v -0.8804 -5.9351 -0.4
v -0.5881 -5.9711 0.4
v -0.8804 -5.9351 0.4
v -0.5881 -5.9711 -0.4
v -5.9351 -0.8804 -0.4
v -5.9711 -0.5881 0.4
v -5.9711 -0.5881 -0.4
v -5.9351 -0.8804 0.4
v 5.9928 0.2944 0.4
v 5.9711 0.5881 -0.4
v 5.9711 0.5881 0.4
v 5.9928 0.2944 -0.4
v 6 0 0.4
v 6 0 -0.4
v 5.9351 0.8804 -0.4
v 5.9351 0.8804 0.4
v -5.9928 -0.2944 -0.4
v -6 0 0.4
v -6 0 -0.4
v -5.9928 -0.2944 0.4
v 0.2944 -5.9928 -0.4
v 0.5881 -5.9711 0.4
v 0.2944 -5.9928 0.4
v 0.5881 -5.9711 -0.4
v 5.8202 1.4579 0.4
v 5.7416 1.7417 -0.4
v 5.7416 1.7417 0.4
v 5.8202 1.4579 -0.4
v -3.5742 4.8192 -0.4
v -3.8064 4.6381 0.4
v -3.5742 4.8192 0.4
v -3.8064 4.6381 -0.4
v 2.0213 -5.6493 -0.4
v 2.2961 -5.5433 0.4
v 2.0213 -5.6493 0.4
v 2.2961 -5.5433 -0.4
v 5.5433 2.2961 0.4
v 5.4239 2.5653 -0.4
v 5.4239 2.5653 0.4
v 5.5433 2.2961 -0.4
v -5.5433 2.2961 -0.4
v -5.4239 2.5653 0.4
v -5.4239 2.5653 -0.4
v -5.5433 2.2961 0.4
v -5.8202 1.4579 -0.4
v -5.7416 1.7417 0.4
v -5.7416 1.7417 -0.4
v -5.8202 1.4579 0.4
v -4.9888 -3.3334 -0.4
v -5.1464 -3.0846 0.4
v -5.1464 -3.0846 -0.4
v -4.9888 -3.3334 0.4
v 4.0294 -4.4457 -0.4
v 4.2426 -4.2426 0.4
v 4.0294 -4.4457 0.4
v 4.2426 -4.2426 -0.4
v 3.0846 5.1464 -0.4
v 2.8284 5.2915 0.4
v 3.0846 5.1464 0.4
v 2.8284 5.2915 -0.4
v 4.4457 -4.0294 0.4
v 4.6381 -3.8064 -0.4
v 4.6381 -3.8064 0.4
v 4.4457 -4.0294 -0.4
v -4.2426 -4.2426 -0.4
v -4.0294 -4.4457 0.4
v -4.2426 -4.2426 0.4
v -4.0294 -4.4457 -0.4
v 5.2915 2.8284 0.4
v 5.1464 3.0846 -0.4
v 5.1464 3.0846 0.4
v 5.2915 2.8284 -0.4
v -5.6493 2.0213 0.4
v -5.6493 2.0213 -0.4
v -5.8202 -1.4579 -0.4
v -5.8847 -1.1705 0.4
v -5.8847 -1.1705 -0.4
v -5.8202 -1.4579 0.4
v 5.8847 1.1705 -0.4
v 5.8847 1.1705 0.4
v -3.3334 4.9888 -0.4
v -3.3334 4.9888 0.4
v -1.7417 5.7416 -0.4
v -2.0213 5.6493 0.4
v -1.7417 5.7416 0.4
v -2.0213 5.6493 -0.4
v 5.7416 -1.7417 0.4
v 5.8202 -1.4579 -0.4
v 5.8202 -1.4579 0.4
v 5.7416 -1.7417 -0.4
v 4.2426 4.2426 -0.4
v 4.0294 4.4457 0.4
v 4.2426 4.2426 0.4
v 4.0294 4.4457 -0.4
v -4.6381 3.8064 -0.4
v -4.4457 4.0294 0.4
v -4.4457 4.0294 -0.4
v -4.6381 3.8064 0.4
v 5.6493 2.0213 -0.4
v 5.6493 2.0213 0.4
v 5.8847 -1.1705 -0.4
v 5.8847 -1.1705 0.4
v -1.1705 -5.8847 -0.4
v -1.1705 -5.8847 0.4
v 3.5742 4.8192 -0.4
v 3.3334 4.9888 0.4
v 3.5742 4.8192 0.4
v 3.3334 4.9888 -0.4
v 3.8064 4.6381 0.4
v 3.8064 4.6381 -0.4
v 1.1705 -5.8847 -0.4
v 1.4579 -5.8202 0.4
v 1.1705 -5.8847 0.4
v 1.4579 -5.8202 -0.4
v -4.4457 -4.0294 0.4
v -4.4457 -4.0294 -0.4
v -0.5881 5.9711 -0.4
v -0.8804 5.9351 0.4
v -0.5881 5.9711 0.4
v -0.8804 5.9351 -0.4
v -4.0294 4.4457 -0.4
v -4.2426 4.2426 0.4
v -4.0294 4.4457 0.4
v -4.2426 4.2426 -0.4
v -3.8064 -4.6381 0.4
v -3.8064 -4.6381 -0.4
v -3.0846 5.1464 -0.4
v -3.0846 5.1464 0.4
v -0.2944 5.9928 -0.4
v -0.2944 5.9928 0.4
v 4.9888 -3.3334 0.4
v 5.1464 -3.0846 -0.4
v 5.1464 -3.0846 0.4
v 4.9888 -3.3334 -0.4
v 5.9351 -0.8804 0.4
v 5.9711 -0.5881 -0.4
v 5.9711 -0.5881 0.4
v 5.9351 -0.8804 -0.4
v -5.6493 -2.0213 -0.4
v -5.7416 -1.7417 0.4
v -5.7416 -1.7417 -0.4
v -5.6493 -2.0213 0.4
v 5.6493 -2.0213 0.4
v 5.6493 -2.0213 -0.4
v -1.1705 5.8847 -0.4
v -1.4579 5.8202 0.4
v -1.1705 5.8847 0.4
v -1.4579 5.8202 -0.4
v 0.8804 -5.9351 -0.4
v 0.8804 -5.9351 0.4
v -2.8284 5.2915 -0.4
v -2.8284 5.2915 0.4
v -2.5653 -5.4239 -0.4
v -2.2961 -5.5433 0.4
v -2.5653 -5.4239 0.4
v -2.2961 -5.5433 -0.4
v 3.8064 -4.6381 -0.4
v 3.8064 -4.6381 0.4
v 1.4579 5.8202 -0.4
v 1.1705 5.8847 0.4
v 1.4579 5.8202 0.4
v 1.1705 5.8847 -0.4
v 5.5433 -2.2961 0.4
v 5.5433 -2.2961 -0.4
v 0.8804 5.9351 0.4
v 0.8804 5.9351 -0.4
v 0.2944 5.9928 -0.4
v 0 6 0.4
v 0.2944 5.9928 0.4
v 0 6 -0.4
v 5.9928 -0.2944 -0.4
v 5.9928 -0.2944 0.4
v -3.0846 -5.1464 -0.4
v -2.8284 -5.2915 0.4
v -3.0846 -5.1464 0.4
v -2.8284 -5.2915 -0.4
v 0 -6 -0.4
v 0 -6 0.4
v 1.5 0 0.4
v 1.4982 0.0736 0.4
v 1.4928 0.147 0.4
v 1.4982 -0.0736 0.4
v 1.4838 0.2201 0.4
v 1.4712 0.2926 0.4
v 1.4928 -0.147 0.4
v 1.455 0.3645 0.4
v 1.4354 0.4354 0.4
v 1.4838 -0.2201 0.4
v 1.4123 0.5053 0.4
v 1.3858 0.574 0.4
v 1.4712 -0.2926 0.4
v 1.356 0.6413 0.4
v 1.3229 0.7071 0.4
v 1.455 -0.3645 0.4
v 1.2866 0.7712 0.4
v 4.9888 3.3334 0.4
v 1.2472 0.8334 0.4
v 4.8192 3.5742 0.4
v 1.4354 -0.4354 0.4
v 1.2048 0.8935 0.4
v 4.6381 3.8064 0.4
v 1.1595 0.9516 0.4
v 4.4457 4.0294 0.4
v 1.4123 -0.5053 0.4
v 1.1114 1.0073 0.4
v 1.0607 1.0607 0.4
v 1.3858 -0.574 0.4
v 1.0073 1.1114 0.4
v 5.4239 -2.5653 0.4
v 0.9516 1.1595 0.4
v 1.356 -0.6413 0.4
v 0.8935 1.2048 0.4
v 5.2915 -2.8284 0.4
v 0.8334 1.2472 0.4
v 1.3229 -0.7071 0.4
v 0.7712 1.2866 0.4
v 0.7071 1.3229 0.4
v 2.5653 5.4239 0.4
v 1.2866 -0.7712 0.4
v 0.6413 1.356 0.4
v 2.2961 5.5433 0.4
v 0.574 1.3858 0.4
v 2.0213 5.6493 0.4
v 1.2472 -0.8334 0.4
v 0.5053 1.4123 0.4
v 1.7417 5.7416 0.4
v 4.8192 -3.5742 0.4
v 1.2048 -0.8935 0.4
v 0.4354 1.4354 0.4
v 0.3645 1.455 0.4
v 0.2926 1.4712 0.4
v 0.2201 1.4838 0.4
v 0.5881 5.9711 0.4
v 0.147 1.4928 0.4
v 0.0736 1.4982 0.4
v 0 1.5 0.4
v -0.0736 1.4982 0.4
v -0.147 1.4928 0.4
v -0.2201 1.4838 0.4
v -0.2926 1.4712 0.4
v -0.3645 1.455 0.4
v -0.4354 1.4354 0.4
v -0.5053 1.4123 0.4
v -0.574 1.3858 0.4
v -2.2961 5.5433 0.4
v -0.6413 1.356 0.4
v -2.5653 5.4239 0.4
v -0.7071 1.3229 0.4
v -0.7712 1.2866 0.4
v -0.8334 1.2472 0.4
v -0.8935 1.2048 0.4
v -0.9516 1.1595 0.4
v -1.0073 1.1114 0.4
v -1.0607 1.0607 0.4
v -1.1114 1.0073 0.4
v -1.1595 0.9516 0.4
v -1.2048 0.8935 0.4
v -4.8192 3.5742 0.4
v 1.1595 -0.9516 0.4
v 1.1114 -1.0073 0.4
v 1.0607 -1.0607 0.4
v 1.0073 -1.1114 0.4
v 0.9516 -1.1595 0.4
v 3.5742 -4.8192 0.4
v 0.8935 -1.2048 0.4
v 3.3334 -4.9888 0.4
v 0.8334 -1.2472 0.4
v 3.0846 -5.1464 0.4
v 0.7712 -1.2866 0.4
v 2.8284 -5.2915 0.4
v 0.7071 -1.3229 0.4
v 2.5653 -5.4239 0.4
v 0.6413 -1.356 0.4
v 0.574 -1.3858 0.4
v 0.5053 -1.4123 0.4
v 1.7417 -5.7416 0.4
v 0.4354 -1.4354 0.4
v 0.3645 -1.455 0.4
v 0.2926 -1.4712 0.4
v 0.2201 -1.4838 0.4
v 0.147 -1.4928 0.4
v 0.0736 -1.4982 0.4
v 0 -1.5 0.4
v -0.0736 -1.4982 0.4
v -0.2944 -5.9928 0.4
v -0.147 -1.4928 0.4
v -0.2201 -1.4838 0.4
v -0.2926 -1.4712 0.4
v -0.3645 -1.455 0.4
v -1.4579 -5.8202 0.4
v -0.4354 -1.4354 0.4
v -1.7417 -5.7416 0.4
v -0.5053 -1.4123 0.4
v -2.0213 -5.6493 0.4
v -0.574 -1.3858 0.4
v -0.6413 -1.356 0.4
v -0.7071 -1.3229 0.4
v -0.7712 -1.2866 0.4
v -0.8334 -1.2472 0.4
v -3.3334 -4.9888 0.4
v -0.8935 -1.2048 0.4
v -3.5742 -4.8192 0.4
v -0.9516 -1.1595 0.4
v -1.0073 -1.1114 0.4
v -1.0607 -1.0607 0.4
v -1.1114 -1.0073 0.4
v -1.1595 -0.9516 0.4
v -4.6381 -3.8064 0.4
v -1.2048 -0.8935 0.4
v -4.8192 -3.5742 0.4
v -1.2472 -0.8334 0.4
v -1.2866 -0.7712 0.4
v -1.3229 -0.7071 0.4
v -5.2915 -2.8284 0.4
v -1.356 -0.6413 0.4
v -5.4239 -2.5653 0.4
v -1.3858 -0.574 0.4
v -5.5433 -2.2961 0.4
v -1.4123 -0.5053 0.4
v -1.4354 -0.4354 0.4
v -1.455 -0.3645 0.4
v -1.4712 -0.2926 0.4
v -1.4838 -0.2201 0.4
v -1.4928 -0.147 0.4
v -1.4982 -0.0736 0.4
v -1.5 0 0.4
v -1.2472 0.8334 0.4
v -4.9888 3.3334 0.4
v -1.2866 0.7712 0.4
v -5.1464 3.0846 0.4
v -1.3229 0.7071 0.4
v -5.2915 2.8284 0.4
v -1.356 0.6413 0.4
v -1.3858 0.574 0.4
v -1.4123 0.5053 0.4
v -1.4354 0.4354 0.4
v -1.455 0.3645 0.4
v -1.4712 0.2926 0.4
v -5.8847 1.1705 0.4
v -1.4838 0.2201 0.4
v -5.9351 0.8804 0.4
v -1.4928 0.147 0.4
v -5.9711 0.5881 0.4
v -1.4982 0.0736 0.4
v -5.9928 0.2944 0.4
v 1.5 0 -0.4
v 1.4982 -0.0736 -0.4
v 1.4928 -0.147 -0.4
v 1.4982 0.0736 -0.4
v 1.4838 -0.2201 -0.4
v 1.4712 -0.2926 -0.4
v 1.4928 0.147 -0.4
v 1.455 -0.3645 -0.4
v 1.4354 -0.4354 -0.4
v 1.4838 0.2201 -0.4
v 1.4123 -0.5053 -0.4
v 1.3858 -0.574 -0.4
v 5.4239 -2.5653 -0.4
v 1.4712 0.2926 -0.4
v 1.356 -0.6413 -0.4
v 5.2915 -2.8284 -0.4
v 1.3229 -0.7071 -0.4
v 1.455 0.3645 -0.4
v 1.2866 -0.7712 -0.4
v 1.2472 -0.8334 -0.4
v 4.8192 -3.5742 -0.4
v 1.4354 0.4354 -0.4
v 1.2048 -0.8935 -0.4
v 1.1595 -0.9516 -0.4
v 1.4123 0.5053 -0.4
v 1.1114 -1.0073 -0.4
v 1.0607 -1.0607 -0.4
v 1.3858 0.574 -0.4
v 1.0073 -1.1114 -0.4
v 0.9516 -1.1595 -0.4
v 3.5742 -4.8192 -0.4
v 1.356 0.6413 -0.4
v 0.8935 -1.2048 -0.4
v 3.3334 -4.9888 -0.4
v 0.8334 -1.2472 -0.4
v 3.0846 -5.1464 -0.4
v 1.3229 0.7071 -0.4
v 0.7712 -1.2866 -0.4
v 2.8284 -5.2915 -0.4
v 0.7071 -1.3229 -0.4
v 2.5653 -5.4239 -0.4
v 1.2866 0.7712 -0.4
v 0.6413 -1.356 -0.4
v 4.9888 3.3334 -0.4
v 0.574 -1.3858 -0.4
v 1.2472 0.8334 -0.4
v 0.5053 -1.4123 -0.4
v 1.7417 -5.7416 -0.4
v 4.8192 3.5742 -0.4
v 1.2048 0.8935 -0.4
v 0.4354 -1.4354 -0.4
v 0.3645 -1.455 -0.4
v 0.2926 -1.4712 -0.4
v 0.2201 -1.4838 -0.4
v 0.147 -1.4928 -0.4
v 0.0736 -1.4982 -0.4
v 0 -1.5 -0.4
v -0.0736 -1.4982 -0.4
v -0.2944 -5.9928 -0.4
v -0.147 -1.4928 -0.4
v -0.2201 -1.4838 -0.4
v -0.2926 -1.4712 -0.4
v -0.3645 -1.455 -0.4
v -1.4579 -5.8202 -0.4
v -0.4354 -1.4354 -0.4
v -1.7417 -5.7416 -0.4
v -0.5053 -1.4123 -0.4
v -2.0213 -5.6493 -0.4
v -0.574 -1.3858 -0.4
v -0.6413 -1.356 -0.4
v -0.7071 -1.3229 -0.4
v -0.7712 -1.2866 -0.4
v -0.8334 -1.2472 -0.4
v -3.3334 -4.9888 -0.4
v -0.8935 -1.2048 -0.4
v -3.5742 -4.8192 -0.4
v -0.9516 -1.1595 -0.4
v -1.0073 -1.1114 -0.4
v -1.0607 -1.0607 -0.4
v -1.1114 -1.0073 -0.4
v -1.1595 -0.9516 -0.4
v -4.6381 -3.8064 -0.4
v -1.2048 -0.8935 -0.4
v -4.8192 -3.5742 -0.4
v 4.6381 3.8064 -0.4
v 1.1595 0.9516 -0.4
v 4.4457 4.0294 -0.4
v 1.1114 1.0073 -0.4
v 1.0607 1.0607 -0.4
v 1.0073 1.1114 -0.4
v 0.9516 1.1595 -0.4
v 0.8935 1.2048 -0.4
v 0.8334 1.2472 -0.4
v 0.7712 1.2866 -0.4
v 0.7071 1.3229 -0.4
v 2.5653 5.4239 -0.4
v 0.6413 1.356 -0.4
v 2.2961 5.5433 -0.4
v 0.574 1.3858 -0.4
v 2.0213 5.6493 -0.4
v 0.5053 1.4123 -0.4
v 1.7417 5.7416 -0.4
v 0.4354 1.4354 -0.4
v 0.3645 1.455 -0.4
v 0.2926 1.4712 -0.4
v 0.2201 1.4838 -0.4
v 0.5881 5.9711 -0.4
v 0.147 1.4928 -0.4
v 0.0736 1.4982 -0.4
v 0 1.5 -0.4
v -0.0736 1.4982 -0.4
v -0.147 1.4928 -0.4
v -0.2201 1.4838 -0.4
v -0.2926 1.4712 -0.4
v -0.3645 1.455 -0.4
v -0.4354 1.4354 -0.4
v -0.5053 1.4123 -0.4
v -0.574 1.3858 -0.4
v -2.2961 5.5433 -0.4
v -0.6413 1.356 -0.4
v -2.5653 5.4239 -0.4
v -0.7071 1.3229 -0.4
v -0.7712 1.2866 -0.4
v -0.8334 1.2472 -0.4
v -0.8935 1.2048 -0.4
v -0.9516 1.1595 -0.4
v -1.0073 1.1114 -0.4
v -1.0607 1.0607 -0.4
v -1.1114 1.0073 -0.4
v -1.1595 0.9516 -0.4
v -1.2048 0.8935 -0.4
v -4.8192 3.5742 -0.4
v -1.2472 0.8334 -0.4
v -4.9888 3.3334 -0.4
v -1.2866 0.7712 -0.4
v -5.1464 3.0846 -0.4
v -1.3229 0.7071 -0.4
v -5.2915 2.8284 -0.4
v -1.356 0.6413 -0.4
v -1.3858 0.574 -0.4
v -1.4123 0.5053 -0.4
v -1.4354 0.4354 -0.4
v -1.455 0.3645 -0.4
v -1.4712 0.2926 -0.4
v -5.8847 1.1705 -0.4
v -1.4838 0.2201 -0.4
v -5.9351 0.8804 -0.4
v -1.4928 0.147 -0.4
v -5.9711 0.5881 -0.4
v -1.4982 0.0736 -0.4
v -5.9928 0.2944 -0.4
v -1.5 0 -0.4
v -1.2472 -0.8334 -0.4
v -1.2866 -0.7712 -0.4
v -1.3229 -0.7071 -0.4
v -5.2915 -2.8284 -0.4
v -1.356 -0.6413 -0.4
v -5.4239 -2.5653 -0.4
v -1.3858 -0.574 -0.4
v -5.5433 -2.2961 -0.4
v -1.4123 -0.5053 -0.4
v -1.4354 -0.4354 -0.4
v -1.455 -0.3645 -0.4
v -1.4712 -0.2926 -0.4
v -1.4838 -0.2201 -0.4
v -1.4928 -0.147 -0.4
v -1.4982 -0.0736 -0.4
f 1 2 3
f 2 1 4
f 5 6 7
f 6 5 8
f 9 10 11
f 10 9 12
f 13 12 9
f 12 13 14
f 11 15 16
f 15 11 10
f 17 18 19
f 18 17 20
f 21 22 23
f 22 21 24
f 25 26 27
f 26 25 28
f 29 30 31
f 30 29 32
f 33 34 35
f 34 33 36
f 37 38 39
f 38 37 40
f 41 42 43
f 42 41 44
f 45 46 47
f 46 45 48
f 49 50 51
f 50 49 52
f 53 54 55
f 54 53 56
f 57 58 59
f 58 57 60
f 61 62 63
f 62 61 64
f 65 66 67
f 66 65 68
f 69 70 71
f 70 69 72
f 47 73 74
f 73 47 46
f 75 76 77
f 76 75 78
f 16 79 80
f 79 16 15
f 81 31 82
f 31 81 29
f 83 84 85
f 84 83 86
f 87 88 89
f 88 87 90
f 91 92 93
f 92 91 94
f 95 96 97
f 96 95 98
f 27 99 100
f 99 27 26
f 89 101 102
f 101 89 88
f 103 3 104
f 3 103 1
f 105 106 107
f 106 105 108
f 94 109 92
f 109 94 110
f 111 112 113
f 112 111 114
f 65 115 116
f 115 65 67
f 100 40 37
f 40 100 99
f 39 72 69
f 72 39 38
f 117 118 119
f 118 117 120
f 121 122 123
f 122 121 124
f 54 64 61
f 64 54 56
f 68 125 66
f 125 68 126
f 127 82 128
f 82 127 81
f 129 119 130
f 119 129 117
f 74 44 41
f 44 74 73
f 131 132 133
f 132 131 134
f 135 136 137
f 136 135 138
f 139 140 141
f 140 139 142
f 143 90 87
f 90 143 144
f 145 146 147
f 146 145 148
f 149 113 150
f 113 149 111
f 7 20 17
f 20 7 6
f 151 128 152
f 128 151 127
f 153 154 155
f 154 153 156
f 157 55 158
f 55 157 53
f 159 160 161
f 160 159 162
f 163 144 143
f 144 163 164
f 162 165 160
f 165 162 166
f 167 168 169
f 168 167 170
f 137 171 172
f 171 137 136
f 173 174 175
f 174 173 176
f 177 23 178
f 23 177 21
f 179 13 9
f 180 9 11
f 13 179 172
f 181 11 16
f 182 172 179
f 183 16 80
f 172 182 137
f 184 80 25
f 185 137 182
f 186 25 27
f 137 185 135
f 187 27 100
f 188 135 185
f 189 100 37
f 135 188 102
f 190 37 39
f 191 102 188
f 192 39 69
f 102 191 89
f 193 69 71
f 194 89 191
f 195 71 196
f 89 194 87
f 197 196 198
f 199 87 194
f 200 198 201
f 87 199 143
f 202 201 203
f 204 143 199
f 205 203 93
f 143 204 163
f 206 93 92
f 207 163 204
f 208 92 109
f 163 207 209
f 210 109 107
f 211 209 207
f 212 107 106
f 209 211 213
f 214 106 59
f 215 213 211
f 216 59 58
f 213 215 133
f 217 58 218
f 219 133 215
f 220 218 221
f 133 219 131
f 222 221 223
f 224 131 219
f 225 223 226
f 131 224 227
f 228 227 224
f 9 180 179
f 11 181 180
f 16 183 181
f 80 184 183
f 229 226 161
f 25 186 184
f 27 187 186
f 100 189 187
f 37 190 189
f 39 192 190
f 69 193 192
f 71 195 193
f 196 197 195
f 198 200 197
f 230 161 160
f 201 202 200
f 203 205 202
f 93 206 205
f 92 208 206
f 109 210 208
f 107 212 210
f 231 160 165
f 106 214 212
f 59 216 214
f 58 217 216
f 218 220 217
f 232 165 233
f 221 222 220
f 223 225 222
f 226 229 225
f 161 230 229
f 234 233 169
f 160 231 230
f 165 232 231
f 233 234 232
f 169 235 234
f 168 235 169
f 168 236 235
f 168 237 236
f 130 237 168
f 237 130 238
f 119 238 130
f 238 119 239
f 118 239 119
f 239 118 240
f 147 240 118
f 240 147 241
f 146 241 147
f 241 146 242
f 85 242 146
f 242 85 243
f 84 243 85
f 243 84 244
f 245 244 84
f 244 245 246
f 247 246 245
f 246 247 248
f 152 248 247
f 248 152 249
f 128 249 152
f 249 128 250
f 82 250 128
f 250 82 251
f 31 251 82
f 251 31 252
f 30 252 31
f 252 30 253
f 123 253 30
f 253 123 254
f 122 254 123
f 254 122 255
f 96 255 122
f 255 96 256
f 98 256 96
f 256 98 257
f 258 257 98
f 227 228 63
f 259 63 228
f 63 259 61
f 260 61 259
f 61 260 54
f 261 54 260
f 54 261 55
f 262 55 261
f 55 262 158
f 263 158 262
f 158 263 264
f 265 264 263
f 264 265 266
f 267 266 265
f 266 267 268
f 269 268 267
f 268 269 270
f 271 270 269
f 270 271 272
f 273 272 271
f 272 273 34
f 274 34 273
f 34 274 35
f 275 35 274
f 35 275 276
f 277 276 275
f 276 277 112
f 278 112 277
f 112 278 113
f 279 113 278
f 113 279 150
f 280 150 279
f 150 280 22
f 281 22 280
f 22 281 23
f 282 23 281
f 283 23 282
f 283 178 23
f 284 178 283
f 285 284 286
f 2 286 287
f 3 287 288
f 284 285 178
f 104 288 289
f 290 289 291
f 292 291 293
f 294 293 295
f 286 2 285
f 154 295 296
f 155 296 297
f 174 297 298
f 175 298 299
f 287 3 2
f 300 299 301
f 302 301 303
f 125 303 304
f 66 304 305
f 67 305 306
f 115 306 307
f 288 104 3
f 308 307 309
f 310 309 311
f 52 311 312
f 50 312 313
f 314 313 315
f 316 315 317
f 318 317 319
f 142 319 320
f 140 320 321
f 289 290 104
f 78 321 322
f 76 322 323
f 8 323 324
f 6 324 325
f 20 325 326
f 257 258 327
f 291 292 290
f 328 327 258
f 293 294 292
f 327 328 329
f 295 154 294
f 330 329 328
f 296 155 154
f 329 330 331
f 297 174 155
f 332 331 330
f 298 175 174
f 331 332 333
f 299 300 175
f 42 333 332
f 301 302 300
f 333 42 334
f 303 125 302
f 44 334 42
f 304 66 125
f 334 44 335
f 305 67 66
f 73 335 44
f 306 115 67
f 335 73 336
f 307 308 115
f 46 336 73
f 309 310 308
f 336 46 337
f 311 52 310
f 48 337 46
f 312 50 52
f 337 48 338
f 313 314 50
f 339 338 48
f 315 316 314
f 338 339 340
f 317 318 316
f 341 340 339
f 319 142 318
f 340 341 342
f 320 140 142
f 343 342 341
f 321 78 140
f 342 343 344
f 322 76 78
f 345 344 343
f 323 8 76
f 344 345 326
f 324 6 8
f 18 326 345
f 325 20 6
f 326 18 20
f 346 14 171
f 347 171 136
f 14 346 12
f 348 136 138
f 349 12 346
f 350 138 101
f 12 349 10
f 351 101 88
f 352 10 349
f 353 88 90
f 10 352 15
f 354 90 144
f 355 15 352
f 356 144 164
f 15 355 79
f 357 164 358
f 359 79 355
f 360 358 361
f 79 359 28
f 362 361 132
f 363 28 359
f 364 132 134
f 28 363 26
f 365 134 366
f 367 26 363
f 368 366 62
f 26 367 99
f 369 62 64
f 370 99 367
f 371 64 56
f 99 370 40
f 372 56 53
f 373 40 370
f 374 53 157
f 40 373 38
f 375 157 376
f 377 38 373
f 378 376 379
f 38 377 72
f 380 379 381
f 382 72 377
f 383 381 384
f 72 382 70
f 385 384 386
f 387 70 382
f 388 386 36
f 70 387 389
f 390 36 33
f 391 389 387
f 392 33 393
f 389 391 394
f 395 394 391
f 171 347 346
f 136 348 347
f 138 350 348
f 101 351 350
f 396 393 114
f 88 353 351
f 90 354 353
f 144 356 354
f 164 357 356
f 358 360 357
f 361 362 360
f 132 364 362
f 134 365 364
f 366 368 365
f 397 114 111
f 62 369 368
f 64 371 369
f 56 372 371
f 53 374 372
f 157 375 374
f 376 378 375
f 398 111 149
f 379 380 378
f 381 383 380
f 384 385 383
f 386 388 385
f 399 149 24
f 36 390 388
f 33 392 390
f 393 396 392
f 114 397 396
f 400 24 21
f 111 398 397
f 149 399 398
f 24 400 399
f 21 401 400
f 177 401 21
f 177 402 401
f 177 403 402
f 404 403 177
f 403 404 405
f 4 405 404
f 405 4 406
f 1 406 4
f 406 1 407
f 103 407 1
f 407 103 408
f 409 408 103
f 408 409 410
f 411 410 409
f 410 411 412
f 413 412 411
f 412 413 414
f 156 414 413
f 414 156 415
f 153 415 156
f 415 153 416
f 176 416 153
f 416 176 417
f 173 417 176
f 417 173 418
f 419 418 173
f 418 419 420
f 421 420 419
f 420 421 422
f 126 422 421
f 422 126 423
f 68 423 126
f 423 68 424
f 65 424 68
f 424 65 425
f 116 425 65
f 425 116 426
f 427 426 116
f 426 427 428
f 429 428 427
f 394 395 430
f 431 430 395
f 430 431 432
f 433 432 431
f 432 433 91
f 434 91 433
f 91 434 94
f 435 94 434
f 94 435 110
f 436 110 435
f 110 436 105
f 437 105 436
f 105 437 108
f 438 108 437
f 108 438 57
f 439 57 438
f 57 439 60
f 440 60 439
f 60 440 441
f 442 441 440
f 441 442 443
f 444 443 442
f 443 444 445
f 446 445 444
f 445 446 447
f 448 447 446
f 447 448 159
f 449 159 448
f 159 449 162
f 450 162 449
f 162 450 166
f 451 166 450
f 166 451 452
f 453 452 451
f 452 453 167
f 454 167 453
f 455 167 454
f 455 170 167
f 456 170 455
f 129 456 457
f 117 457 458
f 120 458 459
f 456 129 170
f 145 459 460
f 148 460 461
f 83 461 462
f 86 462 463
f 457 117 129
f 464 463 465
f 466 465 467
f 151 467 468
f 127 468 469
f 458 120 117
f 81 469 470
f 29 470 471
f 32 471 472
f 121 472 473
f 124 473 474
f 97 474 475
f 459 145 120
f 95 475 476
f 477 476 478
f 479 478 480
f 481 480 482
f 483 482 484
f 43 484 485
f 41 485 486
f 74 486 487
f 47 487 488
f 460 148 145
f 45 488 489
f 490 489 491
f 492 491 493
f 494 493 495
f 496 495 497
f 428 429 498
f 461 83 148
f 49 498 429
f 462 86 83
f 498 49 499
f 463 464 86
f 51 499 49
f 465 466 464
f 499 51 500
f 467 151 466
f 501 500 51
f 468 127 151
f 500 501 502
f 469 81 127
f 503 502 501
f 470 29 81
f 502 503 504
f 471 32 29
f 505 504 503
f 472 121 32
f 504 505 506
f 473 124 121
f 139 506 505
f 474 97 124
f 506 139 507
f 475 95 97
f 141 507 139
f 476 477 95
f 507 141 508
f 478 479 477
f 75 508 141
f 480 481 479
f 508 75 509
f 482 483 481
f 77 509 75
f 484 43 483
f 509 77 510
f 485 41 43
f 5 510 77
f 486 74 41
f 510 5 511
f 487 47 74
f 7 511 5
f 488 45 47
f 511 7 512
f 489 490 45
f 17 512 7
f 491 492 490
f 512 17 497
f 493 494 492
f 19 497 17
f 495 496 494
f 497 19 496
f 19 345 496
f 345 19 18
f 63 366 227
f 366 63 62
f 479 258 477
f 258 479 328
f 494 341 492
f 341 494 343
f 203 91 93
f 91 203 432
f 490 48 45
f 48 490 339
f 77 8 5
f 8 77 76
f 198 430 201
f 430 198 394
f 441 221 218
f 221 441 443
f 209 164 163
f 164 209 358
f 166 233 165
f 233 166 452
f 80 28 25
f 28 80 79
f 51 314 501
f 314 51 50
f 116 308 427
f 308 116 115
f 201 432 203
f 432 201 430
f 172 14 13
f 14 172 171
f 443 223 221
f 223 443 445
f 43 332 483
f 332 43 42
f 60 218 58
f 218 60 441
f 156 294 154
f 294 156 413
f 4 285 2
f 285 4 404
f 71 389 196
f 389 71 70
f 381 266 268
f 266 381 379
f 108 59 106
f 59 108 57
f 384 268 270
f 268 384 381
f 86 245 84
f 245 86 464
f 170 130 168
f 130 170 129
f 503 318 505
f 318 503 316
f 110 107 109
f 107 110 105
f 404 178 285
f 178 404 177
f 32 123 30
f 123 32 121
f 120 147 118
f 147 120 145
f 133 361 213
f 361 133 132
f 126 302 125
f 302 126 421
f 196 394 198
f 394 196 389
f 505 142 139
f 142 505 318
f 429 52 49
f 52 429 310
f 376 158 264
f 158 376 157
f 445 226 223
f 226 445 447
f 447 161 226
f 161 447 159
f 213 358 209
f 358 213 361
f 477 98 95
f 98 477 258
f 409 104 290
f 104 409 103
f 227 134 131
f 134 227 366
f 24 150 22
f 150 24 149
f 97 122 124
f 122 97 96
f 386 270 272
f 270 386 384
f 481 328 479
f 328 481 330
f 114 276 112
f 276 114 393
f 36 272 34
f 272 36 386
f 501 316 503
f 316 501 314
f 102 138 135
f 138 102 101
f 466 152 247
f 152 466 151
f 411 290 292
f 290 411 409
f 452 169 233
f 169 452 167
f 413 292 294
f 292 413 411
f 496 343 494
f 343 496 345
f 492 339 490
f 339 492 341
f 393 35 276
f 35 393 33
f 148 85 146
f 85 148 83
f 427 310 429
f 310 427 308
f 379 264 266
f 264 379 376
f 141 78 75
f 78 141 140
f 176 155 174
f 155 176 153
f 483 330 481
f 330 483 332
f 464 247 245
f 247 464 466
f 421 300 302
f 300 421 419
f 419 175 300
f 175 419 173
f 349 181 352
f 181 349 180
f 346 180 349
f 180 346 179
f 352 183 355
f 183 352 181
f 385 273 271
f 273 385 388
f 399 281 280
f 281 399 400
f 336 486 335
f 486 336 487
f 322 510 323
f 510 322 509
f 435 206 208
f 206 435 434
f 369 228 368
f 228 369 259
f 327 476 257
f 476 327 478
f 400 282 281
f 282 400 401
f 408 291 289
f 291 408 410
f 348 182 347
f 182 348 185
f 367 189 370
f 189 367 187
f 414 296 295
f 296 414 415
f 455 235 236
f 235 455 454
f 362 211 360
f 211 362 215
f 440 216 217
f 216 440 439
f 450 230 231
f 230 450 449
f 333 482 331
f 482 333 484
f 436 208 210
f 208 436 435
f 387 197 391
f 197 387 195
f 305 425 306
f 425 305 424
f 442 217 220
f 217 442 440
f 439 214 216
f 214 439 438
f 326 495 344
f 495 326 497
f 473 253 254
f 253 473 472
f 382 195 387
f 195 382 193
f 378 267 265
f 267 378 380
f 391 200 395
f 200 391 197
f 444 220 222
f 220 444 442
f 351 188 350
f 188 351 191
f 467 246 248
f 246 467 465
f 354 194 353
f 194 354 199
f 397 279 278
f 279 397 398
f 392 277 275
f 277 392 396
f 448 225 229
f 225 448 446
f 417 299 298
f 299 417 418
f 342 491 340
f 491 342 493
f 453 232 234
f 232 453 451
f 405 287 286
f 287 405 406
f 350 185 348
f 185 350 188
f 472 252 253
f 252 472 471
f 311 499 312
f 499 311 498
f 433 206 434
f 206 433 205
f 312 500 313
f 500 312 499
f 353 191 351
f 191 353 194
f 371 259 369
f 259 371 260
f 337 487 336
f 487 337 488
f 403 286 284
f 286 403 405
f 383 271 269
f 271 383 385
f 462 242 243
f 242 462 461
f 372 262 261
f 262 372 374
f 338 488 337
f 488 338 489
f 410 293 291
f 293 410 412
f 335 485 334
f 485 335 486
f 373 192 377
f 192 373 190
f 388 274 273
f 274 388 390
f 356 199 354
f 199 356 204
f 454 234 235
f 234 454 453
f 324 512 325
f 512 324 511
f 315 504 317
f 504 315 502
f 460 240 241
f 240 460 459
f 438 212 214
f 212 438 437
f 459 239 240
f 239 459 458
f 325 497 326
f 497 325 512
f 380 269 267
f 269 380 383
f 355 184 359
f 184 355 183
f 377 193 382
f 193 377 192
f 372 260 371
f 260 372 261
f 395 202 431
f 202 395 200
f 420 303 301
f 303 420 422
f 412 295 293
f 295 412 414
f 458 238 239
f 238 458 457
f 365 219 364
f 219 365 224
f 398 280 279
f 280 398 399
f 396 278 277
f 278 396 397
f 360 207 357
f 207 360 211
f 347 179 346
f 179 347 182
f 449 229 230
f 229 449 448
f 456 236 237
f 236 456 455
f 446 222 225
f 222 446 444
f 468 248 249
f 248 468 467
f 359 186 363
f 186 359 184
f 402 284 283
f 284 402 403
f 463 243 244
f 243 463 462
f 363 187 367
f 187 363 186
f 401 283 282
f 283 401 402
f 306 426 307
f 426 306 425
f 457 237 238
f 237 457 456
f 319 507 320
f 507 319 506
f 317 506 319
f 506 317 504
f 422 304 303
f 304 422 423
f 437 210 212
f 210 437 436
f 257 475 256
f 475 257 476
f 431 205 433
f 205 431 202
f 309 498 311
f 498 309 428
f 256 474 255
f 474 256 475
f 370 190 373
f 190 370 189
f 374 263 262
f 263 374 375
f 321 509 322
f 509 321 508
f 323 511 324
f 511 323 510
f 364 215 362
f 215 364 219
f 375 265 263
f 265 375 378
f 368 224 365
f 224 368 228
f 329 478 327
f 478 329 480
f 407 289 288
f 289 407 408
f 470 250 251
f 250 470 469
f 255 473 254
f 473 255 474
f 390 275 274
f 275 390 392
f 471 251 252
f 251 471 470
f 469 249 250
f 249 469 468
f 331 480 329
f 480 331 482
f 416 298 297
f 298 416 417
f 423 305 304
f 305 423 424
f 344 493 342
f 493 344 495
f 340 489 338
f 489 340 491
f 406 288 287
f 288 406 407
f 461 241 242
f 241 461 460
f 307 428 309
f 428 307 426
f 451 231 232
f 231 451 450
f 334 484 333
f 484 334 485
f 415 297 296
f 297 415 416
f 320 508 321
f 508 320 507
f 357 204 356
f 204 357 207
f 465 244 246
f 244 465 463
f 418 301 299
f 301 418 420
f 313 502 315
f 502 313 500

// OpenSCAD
// Penny washer parameters (mm)
inner_diameter_mm = 3.0;   //[1.5:6.0:0.1]
outer_diameter_mm = 12.0;  //[6.0:24.0:0.1]
thickness_mm      = 0.8;   //[0.4:1.6:0.05]

// Small extra height to guarantee a clean through-hole
eps_mm = 0.2; //[0.05:1.0:0.05]

$fn = 128;

module penny_washer() {
    difference() {
        cylinder(d=outer_diameter_mm, h=thickness_mm, center=true);
        cylinder(d=inner_diameter_mm, h=thickness_mm + 2*eps_mm, center=true);
    }
}

penny_washer();
